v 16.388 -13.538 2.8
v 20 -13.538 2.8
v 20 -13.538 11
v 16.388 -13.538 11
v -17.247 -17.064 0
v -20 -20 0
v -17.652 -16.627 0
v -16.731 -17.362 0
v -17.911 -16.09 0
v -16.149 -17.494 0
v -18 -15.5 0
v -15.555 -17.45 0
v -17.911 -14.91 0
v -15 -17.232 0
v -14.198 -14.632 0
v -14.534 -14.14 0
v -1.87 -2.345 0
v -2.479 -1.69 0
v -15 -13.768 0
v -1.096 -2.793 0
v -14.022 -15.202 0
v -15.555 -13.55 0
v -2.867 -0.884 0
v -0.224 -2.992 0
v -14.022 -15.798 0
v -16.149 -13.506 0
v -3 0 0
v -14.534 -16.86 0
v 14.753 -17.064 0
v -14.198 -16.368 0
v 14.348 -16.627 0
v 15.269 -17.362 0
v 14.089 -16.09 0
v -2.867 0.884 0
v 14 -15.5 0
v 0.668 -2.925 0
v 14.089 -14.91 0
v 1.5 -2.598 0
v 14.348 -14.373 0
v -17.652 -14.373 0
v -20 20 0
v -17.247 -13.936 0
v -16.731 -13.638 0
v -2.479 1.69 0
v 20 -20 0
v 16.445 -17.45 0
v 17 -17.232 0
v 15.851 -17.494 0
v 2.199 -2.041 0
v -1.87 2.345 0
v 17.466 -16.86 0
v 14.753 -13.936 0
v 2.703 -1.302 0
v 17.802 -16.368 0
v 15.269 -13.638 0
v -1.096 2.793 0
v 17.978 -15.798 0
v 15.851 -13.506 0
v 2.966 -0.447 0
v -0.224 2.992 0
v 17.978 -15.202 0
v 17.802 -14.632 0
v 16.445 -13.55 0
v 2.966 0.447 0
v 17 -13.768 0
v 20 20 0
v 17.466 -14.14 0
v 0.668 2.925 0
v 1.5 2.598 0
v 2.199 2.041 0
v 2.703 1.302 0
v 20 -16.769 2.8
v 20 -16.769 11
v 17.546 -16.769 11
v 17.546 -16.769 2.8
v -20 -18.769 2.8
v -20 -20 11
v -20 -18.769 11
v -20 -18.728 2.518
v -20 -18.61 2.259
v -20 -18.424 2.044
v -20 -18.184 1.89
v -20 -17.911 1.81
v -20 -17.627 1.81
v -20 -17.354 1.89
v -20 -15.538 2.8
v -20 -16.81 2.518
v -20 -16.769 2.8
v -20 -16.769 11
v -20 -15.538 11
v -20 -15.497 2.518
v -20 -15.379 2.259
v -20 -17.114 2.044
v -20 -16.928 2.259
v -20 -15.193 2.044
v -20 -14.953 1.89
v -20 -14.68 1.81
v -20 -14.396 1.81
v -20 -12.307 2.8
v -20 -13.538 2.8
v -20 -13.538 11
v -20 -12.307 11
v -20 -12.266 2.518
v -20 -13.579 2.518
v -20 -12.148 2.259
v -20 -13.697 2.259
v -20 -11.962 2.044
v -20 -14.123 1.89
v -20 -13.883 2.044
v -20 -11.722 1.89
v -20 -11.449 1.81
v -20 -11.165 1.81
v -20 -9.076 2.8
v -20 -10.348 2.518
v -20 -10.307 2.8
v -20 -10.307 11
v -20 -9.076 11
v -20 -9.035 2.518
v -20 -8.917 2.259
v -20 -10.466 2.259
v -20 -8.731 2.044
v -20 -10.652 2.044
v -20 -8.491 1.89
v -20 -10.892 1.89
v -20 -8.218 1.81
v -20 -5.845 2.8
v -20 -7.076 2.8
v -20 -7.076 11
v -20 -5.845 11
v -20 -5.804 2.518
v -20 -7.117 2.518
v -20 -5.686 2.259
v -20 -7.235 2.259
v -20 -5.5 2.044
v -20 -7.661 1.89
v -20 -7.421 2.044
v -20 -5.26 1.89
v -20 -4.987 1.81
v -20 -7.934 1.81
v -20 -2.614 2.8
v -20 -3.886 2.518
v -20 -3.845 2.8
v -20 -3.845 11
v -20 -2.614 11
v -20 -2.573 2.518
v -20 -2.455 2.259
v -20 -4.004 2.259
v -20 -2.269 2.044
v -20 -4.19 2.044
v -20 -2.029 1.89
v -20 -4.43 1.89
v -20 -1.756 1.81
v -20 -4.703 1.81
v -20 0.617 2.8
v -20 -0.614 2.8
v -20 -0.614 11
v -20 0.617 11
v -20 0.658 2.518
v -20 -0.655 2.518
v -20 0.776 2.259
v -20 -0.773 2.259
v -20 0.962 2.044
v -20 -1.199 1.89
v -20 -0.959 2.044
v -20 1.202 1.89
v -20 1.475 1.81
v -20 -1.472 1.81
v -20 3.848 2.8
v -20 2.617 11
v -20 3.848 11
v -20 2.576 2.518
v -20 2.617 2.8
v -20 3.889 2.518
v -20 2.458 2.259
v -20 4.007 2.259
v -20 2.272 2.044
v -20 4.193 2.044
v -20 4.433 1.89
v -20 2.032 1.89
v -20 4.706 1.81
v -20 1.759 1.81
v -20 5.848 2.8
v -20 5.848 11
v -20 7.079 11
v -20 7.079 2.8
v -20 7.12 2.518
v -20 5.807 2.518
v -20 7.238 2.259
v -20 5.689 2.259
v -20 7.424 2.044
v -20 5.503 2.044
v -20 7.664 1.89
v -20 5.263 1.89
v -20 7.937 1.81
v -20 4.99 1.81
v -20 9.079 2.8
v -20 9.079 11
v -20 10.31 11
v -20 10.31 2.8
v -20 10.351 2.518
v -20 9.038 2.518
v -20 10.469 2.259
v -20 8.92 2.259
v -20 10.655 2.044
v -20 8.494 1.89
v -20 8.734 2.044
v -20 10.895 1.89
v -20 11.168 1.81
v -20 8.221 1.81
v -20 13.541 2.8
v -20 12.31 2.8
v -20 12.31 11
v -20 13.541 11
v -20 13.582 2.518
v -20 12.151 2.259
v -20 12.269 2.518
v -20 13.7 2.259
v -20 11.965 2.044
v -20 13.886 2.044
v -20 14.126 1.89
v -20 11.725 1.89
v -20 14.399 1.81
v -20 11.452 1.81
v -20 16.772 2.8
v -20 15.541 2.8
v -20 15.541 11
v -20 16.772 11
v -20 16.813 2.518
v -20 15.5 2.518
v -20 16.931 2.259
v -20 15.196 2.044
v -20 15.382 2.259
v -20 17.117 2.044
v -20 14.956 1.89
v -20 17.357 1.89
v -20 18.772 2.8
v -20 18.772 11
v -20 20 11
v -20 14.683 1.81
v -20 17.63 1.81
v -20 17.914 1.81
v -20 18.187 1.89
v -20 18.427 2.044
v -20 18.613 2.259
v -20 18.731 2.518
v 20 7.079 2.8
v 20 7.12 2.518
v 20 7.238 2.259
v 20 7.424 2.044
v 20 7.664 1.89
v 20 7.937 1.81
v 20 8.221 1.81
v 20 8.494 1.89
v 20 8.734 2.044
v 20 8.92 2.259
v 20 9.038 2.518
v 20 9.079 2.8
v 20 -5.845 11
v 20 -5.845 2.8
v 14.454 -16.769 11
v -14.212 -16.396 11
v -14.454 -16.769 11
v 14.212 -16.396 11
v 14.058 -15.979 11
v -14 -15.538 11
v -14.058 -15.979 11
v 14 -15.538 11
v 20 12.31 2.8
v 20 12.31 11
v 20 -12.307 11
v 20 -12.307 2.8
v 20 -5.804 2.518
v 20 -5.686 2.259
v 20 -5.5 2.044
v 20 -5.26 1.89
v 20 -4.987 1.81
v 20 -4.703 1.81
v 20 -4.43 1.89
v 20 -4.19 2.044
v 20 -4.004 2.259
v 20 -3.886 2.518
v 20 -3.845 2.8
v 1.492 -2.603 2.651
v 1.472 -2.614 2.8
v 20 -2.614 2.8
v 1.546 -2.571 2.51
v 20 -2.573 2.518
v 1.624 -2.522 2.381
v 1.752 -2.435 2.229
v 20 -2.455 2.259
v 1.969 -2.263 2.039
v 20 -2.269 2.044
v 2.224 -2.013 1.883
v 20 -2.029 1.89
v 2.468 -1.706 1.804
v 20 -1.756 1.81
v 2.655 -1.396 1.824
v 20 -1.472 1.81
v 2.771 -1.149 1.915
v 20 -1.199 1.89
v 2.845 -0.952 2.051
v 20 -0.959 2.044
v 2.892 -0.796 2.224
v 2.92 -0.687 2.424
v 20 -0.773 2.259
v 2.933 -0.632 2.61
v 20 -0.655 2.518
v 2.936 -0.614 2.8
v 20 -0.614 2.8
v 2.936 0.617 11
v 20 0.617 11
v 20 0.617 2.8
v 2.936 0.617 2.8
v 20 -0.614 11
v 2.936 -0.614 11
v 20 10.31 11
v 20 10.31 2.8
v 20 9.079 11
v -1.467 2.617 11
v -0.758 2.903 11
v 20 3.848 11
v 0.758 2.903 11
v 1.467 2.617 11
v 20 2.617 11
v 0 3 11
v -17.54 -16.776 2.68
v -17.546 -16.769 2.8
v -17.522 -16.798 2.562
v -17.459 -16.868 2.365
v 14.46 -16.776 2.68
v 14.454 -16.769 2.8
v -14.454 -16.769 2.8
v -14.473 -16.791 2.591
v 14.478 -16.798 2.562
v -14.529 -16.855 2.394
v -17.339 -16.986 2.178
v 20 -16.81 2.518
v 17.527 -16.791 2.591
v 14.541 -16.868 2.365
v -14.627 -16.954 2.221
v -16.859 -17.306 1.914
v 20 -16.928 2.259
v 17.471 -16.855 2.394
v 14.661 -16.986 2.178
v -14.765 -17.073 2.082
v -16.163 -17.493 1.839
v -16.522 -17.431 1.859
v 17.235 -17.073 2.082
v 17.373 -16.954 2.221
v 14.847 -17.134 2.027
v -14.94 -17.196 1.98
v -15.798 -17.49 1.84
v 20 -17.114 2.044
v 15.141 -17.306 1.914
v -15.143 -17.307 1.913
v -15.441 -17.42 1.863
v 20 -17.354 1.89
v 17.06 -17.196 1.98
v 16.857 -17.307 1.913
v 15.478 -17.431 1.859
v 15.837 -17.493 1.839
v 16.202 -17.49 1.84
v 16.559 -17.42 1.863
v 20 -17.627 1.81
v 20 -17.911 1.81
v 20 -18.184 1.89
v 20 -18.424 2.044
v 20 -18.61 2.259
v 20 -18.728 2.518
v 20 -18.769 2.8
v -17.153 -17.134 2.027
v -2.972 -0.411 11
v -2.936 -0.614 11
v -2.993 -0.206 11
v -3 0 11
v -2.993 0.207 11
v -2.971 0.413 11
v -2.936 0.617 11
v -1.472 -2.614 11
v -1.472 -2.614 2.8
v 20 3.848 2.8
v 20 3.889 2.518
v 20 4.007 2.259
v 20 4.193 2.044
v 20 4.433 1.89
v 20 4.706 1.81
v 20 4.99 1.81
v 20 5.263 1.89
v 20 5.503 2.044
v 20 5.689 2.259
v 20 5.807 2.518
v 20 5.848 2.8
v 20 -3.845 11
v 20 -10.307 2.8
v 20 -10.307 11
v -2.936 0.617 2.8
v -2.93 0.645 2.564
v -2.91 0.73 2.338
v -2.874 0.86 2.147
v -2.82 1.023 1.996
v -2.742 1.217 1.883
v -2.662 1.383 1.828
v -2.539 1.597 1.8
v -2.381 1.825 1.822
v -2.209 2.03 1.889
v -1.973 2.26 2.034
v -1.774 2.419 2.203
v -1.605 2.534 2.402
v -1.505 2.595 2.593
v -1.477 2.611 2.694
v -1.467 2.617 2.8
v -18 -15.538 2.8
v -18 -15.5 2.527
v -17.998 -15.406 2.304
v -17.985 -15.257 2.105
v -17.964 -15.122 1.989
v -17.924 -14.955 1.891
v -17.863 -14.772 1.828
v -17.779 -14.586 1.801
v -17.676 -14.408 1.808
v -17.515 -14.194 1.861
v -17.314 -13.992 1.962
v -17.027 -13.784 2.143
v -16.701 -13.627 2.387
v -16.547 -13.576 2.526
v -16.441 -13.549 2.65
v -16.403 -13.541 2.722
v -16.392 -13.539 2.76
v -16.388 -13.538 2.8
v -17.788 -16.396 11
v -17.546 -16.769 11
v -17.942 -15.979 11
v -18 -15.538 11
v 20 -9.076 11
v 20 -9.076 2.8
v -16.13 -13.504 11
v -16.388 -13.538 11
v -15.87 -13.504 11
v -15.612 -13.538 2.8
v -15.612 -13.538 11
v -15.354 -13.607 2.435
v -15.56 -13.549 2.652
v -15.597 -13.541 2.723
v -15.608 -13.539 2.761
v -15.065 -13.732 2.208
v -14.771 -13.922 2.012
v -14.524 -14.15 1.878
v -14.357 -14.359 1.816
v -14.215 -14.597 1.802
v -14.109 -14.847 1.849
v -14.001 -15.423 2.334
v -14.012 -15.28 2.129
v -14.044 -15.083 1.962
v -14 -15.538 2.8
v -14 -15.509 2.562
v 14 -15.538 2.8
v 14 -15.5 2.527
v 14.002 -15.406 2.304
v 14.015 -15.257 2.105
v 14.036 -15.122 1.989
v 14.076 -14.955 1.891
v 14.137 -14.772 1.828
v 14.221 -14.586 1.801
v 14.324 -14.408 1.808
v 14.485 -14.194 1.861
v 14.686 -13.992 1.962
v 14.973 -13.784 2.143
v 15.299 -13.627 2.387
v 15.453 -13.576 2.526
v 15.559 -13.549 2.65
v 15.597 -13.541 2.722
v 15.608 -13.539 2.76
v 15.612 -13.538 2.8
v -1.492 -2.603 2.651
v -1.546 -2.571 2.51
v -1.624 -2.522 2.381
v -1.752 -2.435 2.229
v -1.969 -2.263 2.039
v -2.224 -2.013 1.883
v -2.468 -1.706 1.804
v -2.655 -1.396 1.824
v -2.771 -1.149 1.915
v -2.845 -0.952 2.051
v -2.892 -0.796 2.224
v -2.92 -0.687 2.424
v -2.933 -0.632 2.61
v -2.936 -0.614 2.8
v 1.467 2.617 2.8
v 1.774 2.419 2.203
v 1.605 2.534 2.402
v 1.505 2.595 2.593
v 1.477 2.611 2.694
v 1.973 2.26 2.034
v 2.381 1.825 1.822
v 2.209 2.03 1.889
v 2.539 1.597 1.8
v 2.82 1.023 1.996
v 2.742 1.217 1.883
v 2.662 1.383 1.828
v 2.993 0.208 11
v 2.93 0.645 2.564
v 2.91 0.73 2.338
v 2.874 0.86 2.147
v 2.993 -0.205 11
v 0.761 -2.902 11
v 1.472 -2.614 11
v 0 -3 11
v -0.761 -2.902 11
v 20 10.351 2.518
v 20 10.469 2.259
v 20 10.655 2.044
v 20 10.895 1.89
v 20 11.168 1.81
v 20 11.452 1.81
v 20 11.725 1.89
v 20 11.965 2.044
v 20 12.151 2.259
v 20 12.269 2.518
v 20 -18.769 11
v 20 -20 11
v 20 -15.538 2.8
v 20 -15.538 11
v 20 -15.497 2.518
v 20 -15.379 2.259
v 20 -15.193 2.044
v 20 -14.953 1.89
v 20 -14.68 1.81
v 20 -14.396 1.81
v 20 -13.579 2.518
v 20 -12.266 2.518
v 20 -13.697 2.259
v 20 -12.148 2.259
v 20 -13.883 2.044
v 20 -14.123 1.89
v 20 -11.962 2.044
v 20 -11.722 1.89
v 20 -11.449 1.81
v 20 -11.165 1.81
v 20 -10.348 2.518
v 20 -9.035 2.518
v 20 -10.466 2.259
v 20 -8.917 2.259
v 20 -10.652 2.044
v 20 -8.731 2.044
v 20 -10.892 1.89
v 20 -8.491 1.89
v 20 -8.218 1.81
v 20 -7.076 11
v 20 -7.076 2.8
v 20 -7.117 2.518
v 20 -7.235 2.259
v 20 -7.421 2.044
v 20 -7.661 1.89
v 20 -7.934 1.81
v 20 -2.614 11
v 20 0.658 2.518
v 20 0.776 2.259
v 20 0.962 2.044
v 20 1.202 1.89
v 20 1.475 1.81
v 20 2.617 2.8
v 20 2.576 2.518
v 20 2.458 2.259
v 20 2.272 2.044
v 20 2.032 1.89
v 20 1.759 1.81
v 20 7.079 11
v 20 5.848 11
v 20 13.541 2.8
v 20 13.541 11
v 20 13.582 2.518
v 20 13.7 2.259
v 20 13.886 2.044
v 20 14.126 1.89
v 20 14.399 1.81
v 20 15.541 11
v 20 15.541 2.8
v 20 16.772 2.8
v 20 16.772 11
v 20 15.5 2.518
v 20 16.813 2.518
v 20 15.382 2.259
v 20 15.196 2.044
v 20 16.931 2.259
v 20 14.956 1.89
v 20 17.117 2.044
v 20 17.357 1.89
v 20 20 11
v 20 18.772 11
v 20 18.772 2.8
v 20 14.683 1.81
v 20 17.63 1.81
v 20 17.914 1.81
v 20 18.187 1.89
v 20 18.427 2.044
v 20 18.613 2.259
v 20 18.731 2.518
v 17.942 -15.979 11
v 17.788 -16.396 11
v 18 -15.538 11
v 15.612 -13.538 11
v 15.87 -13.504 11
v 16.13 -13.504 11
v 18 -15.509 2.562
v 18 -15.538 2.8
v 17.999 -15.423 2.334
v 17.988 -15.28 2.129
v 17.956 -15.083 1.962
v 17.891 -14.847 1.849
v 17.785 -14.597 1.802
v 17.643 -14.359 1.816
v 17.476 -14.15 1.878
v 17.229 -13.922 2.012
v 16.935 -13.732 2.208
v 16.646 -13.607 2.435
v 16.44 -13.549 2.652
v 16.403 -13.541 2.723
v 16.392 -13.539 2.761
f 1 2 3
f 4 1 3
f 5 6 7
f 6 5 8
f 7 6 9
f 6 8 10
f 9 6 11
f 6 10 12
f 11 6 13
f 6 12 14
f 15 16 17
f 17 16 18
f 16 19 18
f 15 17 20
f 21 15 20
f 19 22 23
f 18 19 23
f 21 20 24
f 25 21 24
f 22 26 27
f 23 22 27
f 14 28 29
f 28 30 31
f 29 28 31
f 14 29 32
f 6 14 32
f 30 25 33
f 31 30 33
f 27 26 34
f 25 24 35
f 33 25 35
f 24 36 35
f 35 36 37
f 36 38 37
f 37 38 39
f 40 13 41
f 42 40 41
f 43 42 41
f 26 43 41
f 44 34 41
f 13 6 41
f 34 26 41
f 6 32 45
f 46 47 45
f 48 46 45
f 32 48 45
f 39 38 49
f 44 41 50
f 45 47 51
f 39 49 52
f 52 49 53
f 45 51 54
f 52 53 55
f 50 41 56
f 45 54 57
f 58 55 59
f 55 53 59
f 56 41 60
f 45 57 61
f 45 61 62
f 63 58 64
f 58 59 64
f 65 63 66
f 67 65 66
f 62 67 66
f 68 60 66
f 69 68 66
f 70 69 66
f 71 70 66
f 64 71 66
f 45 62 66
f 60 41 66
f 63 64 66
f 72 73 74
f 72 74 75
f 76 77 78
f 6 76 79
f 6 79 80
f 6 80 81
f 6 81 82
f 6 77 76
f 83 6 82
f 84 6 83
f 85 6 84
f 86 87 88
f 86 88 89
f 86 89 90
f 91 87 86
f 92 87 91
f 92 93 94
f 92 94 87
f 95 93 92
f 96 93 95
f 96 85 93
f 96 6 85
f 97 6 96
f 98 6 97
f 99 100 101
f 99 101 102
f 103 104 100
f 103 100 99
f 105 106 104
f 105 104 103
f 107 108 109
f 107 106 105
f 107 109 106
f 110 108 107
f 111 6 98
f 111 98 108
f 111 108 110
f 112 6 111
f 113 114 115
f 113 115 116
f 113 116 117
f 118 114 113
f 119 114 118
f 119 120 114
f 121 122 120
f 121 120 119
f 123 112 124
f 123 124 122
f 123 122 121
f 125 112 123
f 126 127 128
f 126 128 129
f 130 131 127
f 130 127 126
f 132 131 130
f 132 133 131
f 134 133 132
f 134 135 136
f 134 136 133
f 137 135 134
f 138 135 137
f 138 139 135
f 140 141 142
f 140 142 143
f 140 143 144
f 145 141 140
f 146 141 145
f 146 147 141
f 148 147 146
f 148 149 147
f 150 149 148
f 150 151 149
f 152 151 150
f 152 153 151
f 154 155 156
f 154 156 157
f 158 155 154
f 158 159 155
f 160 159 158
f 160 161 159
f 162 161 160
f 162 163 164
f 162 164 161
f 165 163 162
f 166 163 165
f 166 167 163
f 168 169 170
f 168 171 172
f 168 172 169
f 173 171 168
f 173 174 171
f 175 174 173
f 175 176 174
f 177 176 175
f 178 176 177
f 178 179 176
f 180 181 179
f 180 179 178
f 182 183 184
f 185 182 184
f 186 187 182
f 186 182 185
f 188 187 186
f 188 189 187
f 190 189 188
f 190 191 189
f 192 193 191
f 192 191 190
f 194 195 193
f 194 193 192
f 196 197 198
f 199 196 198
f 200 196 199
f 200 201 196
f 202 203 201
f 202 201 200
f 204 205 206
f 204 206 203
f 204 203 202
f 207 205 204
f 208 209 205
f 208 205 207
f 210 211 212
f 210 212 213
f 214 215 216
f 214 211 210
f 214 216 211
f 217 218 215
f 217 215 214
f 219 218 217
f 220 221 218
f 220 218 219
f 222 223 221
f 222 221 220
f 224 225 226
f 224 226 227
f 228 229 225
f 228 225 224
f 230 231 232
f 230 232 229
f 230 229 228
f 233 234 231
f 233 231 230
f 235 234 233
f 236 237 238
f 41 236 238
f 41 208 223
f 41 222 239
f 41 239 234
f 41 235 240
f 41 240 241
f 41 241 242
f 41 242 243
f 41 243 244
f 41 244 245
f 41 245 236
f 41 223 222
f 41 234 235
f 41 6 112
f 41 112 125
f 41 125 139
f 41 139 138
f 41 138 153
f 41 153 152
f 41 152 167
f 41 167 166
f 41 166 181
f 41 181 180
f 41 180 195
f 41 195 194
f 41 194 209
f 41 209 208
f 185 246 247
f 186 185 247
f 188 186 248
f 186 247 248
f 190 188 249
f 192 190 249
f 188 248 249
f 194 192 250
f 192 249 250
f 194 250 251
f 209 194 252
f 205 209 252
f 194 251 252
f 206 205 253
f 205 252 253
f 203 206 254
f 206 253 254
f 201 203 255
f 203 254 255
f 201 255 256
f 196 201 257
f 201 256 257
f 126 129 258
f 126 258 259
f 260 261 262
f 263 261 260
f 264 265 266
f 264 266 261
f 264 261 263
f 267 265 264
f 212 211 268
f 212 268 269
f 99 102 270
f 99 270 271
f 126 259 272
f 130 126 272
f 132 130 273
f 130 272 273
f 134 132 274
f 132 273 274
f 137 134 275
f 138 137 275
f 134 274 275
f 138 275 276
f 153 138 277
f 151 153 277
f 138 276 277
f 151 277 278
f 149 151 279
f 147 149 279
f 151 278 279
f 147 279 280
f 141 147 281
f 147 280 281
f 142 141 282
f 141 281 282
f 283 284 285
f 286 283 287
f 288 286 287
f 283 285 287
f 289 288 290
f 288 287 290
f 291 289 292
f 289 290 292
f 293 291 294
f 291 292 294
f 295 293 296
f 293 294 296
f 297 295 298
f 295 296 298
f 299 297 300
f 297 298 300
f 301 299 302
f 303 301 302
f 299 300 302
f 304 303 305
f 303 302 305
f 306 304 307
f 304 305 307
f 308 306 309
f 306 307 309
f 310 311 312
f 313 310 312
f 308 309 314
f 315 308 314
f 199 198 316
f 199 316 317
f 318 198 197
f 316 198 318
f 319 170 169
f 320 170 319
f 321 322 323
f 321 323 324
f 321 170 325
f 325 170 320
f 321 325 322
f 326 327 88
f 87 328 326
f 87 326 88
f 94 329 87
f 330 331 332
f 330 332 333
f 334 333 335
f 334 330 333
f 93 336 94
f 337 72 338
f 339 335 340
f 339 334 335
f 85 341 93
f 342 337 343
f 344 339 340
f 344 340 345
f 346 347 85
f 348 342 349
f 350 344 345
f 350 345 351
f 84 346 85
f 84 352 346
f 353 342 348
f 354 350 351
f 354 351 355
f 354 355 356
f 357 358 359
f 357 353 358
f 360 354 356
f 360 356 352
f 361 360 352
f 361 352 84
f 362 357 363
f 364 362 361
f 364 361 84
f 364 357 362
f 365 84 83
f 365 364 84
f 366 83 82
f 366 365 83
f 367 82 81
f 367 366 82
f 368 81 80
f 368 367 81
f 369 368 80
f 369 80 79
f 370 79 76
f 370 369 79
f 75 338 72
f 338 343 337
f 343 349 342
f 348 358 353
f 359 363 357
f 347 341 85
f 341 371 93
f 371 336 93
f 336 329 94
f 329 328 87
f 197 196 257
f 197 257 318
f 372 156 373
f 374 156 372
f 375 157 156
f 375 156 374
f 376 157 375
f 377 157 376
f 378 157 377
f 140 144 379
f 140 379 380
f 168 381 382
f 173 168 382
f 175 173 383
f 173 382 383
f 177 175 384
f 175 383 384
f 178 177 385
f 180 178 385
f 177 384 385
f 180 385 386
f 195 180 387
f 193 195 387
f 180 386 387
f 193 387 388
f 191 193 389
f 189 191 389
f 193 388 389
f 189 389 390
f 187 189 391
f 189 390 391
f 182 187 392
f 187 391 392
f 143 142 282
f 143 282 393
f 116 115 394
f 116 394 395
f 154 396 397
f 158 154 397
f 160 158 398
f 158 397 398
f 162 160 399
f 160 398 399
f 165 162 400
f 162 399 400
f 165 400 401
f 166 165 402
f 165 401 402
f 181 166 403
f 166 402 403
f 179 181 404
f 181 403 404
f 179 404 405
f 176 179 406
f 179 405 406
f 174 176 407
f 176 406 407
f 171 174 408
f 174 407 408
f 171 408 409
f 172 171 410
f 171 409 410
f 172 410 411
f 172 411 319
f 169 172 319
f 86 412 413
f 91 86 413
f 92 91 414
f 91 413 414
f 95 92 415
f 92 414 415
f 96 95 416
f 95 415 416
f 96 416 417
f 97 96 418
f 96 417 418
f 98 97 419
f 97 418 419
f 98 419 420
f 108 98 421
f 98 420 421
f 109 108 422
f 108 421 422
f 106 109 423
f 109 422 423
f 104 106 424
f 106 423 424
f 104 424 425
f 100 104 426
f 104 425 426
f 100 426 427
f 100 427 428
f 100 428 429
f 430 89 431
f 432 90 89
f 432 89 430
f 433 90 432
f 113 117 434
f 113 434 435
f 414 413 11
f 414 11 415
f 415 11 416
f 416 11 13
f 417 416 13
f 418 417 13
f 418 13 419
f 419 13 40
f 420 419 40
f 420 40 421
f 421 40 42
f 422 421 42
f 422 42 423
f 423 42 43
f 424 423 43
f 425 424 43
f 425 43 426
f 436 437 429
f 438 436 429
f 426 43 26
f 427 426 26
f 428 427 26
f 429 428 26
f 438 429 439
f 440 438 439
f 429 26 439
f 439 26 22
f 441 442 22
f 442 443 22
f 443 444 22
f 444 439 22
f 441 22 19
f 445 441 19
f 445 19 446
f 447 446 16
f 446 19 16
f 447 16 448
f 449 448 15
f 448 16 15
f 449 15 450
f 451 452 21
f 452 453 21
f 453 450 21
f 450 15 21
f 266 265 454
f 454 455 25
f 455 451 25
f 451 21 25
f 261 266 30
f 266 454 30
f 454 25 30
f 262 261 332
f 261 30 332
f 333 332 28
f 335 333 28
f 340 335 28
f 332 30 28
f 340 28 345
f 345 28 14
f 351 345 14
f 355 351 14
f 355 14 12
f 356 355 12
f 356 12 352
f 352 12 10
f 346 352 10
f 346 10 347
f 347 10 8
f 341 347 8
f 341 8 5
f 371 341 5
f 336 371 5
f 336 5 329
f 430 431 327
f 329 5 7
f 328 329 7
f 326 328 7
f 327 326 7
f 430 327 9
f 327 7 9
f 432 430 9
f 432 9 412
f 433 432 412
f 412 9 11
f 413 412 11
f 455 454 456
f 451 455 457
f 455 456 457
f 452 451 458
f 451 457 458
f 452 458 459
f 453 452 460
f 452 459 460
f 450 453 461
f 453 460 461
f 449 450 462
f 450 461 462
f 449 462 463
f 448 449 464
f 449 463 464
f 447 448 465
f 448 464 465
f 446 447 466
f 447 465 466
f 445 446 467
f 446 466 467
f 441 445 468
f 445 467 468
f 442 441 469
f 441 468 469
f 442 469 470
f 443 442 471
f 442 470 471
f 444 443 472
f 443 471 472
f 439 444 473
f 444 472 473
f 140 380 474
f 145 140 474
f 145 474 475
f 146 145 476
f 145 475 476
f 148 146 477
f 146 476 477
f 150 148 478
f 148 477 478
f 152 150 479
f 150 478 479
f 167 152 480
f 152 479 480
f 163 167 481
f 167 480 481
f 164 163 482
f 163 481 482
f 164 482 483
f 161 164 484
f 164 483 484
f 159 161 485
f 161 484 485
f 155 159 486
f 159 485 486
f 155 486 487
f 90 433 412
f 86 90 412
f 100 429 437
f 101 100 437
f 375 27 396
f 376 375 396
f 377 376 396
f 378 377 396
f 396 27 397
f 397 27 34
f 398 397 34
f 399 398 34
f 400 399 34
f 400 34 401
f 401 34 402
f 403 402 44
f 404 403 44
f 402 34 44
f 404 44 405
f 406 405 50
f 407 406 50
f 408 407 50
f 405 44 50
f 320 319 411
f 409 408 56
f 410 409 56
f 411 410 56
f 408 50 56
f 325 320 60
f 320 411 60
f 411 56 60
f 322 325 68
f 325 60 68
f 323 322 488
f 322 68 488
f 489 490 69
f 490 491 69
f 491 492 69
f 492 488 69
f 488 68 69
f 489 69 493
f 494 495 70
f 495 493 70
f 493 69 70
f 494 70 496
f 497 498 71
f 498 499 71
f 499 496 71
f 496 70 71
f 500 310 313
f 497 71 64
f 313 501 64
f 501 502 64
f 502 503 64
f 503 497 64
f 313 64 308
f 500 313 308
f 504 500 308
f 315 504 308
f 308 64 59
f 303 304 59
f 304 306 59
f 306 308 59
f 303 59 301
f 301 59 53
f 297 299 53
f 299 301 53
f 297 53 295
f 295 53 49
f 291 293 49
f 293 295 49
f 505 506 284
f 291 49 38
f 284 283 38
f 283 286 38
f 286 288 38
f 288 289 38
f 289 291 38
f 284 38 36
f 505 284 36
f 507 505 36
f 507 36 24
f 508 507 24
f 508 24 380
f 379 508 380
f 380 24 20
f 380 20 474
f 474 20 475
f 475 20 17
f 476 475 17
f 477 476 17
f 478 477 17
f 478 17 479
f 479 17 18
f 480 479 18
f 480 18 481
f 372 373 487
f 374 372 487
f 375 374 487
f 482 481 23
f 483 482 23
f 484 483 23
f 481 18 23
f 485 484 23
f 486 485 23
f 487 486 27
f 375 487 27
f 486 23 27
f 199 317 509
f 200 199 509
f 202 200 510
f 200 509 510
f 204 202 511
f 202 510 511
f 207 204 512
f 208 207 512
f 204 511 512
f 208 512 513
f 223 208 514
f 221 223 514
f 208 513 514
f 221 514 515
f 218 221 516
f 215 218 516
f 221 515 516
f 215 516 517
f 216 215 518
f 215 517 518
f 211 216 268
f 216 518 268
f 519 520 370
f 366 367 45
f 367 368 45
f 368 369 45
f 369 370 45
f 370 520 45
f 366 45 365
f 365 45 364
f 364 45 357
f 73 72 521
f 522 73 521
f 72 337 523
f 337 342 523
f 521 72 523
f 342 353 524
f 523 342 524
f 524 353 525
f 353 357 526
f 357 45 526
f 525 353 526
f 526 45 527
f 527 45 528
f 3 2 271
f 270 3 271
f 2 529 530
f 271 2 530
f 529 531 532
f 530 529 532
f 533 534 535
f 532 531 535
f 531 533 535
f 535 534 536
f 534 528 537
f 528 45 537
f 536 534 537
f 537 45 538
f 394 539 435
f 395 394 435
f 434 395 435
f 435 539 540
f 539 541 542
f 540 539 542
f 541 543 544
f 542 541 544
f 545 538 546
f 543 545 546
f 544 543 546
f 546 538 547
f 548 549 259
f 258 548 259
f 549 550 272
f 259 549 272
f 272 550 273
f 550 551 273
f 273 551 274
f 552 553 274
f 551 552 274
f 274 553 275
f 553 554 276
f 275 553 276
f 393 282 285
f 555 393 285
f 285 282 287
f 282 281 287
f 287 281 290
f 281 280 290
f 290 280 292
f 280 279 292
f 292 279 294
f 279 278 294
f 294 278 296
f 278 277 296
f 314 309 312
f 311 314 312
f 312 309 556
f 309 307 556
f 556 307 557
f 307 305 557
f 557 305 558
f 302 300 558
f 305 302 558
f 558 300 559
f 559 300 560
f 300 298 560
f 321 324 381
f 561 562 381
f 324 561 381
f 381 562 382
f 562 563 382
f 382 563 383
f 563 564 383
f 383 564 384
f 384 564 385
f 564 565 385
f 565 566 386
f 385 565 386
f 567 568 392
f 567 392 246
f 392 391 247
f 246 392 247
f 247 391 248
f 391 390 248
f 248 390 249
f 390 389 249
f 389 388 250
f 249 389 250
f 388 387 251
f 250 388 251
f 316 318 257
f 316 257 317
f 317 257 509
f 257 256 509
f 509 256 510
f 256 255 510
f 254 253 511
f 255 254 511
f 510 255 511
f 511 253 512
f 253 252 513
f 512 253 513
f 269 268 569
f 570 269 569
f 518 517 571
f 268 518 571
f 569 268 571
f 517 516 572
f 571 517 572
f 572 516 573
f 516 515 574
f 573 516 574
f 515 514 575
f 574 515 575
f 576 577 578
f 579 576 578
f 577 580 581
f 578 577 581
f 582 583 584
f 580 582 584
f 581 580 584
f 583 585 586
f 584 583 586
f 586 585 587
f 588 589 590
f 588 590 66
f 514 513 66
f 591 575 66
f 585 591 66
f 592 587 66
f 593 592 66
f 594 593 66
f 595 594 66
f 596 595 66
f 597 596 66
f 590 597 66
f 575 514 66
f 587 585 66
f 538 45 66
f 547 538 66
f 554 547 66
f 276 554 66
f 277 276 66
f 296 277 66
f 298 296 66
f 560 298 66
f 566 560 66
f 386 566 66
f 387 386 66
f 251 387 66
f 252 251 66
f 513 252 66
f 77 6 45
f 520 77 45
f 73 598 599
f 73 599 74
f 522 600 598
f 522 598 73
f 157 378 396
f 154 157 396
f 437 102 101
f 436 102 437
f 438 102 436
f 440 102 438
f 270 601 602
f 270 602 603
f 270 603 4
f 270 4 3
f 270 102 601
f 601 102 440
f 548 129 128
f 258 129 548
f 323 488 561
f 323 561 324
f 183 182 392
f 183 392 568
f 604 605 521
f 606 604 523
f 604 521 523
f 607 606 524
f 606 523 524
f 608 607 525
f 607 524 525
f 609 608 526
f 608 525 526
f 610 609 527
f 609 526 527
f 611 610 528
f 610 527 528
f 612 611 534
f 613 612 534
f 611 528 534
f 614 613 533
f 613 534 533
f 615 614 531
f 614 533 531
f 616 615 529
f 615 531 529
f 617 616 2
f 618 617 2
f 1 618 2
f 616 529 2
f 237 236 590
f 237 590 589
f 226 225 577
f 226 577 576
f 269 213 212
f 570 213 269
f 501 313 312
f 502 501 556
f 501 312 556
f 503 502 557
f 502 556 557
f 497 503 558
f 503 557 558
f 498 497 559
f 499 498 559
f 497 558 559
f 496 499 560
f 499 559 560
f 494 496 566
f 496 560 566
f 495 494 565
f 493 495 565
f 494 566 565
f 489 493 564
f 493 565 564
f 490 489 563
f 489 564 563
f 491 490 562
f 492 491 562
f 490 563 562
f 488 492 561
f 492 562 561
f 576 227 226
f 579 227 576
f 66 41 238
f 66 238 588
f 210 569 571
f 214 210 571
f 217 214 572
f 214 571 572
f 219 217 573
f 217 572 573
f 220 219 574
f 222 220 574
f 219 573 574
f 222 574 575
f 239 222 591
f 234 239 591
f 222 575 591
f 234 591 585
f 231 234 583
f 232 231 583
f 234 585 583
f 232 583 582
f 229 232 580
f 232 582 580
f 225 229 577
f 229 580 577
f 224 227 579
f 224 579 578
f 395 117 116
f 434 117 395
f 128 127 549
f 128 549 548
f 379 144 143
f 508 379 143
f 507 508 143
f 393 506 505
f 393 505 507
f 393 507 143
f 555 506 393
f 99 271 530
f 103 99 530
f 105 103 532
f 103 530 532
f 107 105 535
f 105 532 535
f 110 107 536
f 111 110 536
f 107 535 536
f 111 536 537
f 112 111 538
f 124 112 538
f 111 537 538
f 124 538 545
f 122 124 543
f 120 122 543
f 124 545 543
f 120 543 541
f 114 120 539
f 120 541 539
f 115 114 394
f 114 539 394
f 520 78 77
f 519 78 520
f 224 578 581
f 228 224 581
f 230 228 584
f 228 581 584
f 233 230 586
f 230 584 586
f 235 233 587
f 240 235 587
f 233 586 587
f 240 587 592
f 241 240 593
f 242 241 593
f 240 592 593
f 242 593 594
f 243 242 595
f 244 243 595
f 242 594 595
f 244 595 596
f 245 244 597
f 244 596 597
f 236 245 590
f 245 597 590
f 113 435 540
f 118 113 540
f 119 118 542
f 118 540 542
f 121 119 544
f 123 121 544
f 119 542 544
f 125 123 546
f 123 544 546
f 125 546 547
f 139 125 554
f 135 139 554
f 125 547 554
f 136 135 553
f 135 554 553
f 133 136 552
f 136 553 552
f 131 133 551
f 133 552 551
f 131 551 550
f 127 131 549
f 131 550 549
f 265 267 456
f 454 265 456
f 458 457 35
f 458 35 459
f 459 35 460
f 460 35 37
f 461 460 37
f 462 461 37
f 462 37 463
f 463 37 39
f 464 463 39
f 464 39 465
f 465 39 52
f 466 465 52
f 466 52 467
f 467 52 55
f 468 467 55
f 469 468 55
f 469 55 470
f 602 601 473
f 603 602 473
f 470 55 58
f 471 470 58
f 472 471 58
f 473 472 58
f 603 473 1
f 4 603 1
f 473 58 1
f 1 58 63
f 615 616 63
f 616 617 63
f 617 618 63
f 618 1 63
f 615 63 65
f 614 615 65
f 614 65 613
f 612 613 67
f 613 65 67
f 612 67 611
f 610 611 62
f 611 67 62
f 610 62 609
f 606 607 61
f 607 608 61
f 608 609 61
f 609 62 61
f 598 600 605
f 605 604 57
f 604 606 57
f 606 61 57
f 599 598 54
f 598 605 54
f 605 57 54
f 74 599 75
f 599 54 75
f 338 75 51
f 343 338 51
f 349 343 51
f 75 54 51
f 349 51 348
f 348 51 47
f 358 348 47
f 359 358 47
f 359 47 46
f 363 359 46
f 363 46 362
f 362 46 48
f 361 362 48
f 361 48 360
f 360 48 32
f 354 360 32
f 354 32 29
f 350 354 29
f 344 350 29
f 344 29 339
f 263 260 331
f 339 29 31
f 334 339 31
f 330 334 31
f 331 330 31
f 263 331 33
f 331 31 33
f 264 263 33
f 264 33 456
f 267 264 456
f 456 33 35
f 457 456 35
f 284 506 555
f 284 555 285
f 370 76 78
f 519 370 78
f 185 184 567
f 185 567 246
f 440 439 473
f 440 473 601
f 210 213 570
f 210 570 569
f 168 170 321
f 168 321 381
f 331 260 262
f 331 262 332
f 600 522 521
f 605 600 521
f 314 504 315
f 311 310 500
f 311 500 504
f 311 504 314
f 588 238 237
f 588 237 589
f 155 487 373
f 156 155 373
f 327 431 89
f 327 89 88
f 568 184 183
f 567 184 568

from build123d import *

# Parameters (mm, degrees)
SKETCH1_W           = 40
SKETCH1_H           = 40
BOSS_EXTRUDE1_DEPTH = 11
CUT_EXTRUDE1_DEPTH  = 47.054315759
SKETCH4_R           = 2
SKETCH4_R_2         = 3
CUT_EXTRUDE2_DEPTH  = 31.347981811


with BuildPart() as part:
    # Sketch1 → Boss-Extrude1 (new body)
    with BuildSketch(Plane.XY):
        Rectangle(SKETCH1_W, SKETCH1_H)
    extrude(amount=BOSS_EXTRUDE1_DEPTH)

    # Sketch3 → Cut-Extrude1 (cut, through all)
    with BuildSketch(Plane(origin=(20, 0, 0), x_dir=(0, 0, -1), z_dir=(1, 0, 0))):
        with BuildLine():
            Line((-11, -18.769), (-11, -16.769))
            Line((-11, -16.769), (-2.8, -16.769))
            ThreePointArc((-2.8, -16.769), (-1.8, -17.769), (-2.8, -18.769))
            Line((-2.8, -18.769), (-11, -18.769))
        make_face()
        with BuildLine():
            Line((-2.8, -13.538), (-11, -13.538))
            Line((-11, -13.538), (-11, -15.538))
            Line((-11, -15.538), (-2.8, -15.538))
            ThreePointArc((-2.8, -15.538), (-1.8, -14.538), (-2.8, -13.538))
        make_face()
        with BuildLine():
            Line((-2.8, -10.307), (-11, -10.307))
            Line((-11, -10.307), (-11, -12.307))
            Line((-11, -12.307), (-2.8, -12.307))
            ThreePointArc((-2.8, -12.307), (-1.8, -11.307), (-2.8, -10.307))
        make_face()
        with BuildLine():
            Line((-2.8, -7.076), (-11, -7.076))
            Line((-11, -7.076), (-11, -9.076))
            Line((-11, -9.076), (-2.8, -9.076))
            ThreePointArc((-2.8, -9.076), (-1.8, -8.076), (-2.8, -7.076))
        make_face()
        with BuildLine():
            Line((-2.8, -3.845), (-11, -3.845))
            Line((-11, -3.845), (-11, -5.845))
            Line((-11, -5.845), (-2.8, -5.845))
            ThreePointArc((-2.8, -5.845), (-1.8, -4.845), (-2.8, -3.845))
        make_face()
        with BuildLine():
            Line((-2.8, -0.614), (-11, -0.614))
            Line((-11, -0.614), (-11, -2.614))
            Line((-11, -2.614), (-2.8, -2.614))
            ThreePointArc((-2.8, -2.614), (-1.8, -1.614), (-2.8, -0.614))
        make_face()
        with BuildLine():
            Line((-2.8, 2.617), (-11, 2.617))
            Line((-11, 2.617), (-11, 0.617))
            Line((-11, 0.617), (-2.8, 0.617))
            ThreePointArc((-2.8, 0.617), (-1.8, 1.617), (-2.8, 2.617))
        make_face()
        with BuildLine():
            Line((-2.8, 5.848), (-11, 5.848))
            Line((-11, 5.848), (-11, 3.848))
            Line((-11, 3.848), (-2.8, 3.848))
            ThreePointArc((-2.8, 3.848), (-1.8, 4.848), (-2.8, 5.848))
        make_face()
        with BuildLine():
            Line((-2.8, 9.079), (-11, 9.079))
            Line((-11, 9.079), (-11, 7.079))
            Line((-11, 7.079), (-2.8, 7.079))
            ThreePointArc((-2.8, 7.079), (-1.8, 8.079), (-2.8, 9.079))
        make_face()
        with BuildLine():
            Line((-2.8, 12.31), (-11, 12.31))
            Line((-11, 12.31), (-11, 10.31))
            Line((-11, 10.31), (-2.8, 10.31))
            ThreePointArc((-2.8, 10.31), (-1.8, 11.31), (-2.8, 12.31))
        make_face()
        with BuildLine():
            Line((-2.8, 15.541), (-11, 15.541))
            Line((-11, 15.541), (-11, 13.541))
            Line((-11, 13.541), (-2.8, 13.541))
            ThreePointArc((-2.8, 13.541), (-1.8, 14.541), (-2.8, 15.541))
        make_face()
        with BuildLine():
            Line((-2.8, 18.772), (-11, 18.772))
            Line((-11, 18.772), (-11, 16.772))
            Line((-11, 16.772), (-2.8, 16.772))
            ThreePointArc((-2.8, 16.772), (-1.8, 17.772), (-2.8, 18.772))
        make_face()
    extrude(amount=-CUT_EXTRUDE1_DEPTH, mode=Mode.SUBTRACT)

    # Sketch4 → Cut-Extrude2 (cut, through all)
    with BuildSketch(Plane(origin=(0, 0, 0), x_dir=(-1, 0, 0), z_dir=(0, 0, -1))):
        with Locations((16, -15.5)):
            Circle(SKETCH4_R)
        with Locations((-16, -15.5)):
            Circle(SKETCH4_R)
        Circle(SKETCH4_R_2)
    extrude(amount=-CUT_EXTRUDE2_DEPTH, mode=Mode.SUBTRACT)


solid = part.part
